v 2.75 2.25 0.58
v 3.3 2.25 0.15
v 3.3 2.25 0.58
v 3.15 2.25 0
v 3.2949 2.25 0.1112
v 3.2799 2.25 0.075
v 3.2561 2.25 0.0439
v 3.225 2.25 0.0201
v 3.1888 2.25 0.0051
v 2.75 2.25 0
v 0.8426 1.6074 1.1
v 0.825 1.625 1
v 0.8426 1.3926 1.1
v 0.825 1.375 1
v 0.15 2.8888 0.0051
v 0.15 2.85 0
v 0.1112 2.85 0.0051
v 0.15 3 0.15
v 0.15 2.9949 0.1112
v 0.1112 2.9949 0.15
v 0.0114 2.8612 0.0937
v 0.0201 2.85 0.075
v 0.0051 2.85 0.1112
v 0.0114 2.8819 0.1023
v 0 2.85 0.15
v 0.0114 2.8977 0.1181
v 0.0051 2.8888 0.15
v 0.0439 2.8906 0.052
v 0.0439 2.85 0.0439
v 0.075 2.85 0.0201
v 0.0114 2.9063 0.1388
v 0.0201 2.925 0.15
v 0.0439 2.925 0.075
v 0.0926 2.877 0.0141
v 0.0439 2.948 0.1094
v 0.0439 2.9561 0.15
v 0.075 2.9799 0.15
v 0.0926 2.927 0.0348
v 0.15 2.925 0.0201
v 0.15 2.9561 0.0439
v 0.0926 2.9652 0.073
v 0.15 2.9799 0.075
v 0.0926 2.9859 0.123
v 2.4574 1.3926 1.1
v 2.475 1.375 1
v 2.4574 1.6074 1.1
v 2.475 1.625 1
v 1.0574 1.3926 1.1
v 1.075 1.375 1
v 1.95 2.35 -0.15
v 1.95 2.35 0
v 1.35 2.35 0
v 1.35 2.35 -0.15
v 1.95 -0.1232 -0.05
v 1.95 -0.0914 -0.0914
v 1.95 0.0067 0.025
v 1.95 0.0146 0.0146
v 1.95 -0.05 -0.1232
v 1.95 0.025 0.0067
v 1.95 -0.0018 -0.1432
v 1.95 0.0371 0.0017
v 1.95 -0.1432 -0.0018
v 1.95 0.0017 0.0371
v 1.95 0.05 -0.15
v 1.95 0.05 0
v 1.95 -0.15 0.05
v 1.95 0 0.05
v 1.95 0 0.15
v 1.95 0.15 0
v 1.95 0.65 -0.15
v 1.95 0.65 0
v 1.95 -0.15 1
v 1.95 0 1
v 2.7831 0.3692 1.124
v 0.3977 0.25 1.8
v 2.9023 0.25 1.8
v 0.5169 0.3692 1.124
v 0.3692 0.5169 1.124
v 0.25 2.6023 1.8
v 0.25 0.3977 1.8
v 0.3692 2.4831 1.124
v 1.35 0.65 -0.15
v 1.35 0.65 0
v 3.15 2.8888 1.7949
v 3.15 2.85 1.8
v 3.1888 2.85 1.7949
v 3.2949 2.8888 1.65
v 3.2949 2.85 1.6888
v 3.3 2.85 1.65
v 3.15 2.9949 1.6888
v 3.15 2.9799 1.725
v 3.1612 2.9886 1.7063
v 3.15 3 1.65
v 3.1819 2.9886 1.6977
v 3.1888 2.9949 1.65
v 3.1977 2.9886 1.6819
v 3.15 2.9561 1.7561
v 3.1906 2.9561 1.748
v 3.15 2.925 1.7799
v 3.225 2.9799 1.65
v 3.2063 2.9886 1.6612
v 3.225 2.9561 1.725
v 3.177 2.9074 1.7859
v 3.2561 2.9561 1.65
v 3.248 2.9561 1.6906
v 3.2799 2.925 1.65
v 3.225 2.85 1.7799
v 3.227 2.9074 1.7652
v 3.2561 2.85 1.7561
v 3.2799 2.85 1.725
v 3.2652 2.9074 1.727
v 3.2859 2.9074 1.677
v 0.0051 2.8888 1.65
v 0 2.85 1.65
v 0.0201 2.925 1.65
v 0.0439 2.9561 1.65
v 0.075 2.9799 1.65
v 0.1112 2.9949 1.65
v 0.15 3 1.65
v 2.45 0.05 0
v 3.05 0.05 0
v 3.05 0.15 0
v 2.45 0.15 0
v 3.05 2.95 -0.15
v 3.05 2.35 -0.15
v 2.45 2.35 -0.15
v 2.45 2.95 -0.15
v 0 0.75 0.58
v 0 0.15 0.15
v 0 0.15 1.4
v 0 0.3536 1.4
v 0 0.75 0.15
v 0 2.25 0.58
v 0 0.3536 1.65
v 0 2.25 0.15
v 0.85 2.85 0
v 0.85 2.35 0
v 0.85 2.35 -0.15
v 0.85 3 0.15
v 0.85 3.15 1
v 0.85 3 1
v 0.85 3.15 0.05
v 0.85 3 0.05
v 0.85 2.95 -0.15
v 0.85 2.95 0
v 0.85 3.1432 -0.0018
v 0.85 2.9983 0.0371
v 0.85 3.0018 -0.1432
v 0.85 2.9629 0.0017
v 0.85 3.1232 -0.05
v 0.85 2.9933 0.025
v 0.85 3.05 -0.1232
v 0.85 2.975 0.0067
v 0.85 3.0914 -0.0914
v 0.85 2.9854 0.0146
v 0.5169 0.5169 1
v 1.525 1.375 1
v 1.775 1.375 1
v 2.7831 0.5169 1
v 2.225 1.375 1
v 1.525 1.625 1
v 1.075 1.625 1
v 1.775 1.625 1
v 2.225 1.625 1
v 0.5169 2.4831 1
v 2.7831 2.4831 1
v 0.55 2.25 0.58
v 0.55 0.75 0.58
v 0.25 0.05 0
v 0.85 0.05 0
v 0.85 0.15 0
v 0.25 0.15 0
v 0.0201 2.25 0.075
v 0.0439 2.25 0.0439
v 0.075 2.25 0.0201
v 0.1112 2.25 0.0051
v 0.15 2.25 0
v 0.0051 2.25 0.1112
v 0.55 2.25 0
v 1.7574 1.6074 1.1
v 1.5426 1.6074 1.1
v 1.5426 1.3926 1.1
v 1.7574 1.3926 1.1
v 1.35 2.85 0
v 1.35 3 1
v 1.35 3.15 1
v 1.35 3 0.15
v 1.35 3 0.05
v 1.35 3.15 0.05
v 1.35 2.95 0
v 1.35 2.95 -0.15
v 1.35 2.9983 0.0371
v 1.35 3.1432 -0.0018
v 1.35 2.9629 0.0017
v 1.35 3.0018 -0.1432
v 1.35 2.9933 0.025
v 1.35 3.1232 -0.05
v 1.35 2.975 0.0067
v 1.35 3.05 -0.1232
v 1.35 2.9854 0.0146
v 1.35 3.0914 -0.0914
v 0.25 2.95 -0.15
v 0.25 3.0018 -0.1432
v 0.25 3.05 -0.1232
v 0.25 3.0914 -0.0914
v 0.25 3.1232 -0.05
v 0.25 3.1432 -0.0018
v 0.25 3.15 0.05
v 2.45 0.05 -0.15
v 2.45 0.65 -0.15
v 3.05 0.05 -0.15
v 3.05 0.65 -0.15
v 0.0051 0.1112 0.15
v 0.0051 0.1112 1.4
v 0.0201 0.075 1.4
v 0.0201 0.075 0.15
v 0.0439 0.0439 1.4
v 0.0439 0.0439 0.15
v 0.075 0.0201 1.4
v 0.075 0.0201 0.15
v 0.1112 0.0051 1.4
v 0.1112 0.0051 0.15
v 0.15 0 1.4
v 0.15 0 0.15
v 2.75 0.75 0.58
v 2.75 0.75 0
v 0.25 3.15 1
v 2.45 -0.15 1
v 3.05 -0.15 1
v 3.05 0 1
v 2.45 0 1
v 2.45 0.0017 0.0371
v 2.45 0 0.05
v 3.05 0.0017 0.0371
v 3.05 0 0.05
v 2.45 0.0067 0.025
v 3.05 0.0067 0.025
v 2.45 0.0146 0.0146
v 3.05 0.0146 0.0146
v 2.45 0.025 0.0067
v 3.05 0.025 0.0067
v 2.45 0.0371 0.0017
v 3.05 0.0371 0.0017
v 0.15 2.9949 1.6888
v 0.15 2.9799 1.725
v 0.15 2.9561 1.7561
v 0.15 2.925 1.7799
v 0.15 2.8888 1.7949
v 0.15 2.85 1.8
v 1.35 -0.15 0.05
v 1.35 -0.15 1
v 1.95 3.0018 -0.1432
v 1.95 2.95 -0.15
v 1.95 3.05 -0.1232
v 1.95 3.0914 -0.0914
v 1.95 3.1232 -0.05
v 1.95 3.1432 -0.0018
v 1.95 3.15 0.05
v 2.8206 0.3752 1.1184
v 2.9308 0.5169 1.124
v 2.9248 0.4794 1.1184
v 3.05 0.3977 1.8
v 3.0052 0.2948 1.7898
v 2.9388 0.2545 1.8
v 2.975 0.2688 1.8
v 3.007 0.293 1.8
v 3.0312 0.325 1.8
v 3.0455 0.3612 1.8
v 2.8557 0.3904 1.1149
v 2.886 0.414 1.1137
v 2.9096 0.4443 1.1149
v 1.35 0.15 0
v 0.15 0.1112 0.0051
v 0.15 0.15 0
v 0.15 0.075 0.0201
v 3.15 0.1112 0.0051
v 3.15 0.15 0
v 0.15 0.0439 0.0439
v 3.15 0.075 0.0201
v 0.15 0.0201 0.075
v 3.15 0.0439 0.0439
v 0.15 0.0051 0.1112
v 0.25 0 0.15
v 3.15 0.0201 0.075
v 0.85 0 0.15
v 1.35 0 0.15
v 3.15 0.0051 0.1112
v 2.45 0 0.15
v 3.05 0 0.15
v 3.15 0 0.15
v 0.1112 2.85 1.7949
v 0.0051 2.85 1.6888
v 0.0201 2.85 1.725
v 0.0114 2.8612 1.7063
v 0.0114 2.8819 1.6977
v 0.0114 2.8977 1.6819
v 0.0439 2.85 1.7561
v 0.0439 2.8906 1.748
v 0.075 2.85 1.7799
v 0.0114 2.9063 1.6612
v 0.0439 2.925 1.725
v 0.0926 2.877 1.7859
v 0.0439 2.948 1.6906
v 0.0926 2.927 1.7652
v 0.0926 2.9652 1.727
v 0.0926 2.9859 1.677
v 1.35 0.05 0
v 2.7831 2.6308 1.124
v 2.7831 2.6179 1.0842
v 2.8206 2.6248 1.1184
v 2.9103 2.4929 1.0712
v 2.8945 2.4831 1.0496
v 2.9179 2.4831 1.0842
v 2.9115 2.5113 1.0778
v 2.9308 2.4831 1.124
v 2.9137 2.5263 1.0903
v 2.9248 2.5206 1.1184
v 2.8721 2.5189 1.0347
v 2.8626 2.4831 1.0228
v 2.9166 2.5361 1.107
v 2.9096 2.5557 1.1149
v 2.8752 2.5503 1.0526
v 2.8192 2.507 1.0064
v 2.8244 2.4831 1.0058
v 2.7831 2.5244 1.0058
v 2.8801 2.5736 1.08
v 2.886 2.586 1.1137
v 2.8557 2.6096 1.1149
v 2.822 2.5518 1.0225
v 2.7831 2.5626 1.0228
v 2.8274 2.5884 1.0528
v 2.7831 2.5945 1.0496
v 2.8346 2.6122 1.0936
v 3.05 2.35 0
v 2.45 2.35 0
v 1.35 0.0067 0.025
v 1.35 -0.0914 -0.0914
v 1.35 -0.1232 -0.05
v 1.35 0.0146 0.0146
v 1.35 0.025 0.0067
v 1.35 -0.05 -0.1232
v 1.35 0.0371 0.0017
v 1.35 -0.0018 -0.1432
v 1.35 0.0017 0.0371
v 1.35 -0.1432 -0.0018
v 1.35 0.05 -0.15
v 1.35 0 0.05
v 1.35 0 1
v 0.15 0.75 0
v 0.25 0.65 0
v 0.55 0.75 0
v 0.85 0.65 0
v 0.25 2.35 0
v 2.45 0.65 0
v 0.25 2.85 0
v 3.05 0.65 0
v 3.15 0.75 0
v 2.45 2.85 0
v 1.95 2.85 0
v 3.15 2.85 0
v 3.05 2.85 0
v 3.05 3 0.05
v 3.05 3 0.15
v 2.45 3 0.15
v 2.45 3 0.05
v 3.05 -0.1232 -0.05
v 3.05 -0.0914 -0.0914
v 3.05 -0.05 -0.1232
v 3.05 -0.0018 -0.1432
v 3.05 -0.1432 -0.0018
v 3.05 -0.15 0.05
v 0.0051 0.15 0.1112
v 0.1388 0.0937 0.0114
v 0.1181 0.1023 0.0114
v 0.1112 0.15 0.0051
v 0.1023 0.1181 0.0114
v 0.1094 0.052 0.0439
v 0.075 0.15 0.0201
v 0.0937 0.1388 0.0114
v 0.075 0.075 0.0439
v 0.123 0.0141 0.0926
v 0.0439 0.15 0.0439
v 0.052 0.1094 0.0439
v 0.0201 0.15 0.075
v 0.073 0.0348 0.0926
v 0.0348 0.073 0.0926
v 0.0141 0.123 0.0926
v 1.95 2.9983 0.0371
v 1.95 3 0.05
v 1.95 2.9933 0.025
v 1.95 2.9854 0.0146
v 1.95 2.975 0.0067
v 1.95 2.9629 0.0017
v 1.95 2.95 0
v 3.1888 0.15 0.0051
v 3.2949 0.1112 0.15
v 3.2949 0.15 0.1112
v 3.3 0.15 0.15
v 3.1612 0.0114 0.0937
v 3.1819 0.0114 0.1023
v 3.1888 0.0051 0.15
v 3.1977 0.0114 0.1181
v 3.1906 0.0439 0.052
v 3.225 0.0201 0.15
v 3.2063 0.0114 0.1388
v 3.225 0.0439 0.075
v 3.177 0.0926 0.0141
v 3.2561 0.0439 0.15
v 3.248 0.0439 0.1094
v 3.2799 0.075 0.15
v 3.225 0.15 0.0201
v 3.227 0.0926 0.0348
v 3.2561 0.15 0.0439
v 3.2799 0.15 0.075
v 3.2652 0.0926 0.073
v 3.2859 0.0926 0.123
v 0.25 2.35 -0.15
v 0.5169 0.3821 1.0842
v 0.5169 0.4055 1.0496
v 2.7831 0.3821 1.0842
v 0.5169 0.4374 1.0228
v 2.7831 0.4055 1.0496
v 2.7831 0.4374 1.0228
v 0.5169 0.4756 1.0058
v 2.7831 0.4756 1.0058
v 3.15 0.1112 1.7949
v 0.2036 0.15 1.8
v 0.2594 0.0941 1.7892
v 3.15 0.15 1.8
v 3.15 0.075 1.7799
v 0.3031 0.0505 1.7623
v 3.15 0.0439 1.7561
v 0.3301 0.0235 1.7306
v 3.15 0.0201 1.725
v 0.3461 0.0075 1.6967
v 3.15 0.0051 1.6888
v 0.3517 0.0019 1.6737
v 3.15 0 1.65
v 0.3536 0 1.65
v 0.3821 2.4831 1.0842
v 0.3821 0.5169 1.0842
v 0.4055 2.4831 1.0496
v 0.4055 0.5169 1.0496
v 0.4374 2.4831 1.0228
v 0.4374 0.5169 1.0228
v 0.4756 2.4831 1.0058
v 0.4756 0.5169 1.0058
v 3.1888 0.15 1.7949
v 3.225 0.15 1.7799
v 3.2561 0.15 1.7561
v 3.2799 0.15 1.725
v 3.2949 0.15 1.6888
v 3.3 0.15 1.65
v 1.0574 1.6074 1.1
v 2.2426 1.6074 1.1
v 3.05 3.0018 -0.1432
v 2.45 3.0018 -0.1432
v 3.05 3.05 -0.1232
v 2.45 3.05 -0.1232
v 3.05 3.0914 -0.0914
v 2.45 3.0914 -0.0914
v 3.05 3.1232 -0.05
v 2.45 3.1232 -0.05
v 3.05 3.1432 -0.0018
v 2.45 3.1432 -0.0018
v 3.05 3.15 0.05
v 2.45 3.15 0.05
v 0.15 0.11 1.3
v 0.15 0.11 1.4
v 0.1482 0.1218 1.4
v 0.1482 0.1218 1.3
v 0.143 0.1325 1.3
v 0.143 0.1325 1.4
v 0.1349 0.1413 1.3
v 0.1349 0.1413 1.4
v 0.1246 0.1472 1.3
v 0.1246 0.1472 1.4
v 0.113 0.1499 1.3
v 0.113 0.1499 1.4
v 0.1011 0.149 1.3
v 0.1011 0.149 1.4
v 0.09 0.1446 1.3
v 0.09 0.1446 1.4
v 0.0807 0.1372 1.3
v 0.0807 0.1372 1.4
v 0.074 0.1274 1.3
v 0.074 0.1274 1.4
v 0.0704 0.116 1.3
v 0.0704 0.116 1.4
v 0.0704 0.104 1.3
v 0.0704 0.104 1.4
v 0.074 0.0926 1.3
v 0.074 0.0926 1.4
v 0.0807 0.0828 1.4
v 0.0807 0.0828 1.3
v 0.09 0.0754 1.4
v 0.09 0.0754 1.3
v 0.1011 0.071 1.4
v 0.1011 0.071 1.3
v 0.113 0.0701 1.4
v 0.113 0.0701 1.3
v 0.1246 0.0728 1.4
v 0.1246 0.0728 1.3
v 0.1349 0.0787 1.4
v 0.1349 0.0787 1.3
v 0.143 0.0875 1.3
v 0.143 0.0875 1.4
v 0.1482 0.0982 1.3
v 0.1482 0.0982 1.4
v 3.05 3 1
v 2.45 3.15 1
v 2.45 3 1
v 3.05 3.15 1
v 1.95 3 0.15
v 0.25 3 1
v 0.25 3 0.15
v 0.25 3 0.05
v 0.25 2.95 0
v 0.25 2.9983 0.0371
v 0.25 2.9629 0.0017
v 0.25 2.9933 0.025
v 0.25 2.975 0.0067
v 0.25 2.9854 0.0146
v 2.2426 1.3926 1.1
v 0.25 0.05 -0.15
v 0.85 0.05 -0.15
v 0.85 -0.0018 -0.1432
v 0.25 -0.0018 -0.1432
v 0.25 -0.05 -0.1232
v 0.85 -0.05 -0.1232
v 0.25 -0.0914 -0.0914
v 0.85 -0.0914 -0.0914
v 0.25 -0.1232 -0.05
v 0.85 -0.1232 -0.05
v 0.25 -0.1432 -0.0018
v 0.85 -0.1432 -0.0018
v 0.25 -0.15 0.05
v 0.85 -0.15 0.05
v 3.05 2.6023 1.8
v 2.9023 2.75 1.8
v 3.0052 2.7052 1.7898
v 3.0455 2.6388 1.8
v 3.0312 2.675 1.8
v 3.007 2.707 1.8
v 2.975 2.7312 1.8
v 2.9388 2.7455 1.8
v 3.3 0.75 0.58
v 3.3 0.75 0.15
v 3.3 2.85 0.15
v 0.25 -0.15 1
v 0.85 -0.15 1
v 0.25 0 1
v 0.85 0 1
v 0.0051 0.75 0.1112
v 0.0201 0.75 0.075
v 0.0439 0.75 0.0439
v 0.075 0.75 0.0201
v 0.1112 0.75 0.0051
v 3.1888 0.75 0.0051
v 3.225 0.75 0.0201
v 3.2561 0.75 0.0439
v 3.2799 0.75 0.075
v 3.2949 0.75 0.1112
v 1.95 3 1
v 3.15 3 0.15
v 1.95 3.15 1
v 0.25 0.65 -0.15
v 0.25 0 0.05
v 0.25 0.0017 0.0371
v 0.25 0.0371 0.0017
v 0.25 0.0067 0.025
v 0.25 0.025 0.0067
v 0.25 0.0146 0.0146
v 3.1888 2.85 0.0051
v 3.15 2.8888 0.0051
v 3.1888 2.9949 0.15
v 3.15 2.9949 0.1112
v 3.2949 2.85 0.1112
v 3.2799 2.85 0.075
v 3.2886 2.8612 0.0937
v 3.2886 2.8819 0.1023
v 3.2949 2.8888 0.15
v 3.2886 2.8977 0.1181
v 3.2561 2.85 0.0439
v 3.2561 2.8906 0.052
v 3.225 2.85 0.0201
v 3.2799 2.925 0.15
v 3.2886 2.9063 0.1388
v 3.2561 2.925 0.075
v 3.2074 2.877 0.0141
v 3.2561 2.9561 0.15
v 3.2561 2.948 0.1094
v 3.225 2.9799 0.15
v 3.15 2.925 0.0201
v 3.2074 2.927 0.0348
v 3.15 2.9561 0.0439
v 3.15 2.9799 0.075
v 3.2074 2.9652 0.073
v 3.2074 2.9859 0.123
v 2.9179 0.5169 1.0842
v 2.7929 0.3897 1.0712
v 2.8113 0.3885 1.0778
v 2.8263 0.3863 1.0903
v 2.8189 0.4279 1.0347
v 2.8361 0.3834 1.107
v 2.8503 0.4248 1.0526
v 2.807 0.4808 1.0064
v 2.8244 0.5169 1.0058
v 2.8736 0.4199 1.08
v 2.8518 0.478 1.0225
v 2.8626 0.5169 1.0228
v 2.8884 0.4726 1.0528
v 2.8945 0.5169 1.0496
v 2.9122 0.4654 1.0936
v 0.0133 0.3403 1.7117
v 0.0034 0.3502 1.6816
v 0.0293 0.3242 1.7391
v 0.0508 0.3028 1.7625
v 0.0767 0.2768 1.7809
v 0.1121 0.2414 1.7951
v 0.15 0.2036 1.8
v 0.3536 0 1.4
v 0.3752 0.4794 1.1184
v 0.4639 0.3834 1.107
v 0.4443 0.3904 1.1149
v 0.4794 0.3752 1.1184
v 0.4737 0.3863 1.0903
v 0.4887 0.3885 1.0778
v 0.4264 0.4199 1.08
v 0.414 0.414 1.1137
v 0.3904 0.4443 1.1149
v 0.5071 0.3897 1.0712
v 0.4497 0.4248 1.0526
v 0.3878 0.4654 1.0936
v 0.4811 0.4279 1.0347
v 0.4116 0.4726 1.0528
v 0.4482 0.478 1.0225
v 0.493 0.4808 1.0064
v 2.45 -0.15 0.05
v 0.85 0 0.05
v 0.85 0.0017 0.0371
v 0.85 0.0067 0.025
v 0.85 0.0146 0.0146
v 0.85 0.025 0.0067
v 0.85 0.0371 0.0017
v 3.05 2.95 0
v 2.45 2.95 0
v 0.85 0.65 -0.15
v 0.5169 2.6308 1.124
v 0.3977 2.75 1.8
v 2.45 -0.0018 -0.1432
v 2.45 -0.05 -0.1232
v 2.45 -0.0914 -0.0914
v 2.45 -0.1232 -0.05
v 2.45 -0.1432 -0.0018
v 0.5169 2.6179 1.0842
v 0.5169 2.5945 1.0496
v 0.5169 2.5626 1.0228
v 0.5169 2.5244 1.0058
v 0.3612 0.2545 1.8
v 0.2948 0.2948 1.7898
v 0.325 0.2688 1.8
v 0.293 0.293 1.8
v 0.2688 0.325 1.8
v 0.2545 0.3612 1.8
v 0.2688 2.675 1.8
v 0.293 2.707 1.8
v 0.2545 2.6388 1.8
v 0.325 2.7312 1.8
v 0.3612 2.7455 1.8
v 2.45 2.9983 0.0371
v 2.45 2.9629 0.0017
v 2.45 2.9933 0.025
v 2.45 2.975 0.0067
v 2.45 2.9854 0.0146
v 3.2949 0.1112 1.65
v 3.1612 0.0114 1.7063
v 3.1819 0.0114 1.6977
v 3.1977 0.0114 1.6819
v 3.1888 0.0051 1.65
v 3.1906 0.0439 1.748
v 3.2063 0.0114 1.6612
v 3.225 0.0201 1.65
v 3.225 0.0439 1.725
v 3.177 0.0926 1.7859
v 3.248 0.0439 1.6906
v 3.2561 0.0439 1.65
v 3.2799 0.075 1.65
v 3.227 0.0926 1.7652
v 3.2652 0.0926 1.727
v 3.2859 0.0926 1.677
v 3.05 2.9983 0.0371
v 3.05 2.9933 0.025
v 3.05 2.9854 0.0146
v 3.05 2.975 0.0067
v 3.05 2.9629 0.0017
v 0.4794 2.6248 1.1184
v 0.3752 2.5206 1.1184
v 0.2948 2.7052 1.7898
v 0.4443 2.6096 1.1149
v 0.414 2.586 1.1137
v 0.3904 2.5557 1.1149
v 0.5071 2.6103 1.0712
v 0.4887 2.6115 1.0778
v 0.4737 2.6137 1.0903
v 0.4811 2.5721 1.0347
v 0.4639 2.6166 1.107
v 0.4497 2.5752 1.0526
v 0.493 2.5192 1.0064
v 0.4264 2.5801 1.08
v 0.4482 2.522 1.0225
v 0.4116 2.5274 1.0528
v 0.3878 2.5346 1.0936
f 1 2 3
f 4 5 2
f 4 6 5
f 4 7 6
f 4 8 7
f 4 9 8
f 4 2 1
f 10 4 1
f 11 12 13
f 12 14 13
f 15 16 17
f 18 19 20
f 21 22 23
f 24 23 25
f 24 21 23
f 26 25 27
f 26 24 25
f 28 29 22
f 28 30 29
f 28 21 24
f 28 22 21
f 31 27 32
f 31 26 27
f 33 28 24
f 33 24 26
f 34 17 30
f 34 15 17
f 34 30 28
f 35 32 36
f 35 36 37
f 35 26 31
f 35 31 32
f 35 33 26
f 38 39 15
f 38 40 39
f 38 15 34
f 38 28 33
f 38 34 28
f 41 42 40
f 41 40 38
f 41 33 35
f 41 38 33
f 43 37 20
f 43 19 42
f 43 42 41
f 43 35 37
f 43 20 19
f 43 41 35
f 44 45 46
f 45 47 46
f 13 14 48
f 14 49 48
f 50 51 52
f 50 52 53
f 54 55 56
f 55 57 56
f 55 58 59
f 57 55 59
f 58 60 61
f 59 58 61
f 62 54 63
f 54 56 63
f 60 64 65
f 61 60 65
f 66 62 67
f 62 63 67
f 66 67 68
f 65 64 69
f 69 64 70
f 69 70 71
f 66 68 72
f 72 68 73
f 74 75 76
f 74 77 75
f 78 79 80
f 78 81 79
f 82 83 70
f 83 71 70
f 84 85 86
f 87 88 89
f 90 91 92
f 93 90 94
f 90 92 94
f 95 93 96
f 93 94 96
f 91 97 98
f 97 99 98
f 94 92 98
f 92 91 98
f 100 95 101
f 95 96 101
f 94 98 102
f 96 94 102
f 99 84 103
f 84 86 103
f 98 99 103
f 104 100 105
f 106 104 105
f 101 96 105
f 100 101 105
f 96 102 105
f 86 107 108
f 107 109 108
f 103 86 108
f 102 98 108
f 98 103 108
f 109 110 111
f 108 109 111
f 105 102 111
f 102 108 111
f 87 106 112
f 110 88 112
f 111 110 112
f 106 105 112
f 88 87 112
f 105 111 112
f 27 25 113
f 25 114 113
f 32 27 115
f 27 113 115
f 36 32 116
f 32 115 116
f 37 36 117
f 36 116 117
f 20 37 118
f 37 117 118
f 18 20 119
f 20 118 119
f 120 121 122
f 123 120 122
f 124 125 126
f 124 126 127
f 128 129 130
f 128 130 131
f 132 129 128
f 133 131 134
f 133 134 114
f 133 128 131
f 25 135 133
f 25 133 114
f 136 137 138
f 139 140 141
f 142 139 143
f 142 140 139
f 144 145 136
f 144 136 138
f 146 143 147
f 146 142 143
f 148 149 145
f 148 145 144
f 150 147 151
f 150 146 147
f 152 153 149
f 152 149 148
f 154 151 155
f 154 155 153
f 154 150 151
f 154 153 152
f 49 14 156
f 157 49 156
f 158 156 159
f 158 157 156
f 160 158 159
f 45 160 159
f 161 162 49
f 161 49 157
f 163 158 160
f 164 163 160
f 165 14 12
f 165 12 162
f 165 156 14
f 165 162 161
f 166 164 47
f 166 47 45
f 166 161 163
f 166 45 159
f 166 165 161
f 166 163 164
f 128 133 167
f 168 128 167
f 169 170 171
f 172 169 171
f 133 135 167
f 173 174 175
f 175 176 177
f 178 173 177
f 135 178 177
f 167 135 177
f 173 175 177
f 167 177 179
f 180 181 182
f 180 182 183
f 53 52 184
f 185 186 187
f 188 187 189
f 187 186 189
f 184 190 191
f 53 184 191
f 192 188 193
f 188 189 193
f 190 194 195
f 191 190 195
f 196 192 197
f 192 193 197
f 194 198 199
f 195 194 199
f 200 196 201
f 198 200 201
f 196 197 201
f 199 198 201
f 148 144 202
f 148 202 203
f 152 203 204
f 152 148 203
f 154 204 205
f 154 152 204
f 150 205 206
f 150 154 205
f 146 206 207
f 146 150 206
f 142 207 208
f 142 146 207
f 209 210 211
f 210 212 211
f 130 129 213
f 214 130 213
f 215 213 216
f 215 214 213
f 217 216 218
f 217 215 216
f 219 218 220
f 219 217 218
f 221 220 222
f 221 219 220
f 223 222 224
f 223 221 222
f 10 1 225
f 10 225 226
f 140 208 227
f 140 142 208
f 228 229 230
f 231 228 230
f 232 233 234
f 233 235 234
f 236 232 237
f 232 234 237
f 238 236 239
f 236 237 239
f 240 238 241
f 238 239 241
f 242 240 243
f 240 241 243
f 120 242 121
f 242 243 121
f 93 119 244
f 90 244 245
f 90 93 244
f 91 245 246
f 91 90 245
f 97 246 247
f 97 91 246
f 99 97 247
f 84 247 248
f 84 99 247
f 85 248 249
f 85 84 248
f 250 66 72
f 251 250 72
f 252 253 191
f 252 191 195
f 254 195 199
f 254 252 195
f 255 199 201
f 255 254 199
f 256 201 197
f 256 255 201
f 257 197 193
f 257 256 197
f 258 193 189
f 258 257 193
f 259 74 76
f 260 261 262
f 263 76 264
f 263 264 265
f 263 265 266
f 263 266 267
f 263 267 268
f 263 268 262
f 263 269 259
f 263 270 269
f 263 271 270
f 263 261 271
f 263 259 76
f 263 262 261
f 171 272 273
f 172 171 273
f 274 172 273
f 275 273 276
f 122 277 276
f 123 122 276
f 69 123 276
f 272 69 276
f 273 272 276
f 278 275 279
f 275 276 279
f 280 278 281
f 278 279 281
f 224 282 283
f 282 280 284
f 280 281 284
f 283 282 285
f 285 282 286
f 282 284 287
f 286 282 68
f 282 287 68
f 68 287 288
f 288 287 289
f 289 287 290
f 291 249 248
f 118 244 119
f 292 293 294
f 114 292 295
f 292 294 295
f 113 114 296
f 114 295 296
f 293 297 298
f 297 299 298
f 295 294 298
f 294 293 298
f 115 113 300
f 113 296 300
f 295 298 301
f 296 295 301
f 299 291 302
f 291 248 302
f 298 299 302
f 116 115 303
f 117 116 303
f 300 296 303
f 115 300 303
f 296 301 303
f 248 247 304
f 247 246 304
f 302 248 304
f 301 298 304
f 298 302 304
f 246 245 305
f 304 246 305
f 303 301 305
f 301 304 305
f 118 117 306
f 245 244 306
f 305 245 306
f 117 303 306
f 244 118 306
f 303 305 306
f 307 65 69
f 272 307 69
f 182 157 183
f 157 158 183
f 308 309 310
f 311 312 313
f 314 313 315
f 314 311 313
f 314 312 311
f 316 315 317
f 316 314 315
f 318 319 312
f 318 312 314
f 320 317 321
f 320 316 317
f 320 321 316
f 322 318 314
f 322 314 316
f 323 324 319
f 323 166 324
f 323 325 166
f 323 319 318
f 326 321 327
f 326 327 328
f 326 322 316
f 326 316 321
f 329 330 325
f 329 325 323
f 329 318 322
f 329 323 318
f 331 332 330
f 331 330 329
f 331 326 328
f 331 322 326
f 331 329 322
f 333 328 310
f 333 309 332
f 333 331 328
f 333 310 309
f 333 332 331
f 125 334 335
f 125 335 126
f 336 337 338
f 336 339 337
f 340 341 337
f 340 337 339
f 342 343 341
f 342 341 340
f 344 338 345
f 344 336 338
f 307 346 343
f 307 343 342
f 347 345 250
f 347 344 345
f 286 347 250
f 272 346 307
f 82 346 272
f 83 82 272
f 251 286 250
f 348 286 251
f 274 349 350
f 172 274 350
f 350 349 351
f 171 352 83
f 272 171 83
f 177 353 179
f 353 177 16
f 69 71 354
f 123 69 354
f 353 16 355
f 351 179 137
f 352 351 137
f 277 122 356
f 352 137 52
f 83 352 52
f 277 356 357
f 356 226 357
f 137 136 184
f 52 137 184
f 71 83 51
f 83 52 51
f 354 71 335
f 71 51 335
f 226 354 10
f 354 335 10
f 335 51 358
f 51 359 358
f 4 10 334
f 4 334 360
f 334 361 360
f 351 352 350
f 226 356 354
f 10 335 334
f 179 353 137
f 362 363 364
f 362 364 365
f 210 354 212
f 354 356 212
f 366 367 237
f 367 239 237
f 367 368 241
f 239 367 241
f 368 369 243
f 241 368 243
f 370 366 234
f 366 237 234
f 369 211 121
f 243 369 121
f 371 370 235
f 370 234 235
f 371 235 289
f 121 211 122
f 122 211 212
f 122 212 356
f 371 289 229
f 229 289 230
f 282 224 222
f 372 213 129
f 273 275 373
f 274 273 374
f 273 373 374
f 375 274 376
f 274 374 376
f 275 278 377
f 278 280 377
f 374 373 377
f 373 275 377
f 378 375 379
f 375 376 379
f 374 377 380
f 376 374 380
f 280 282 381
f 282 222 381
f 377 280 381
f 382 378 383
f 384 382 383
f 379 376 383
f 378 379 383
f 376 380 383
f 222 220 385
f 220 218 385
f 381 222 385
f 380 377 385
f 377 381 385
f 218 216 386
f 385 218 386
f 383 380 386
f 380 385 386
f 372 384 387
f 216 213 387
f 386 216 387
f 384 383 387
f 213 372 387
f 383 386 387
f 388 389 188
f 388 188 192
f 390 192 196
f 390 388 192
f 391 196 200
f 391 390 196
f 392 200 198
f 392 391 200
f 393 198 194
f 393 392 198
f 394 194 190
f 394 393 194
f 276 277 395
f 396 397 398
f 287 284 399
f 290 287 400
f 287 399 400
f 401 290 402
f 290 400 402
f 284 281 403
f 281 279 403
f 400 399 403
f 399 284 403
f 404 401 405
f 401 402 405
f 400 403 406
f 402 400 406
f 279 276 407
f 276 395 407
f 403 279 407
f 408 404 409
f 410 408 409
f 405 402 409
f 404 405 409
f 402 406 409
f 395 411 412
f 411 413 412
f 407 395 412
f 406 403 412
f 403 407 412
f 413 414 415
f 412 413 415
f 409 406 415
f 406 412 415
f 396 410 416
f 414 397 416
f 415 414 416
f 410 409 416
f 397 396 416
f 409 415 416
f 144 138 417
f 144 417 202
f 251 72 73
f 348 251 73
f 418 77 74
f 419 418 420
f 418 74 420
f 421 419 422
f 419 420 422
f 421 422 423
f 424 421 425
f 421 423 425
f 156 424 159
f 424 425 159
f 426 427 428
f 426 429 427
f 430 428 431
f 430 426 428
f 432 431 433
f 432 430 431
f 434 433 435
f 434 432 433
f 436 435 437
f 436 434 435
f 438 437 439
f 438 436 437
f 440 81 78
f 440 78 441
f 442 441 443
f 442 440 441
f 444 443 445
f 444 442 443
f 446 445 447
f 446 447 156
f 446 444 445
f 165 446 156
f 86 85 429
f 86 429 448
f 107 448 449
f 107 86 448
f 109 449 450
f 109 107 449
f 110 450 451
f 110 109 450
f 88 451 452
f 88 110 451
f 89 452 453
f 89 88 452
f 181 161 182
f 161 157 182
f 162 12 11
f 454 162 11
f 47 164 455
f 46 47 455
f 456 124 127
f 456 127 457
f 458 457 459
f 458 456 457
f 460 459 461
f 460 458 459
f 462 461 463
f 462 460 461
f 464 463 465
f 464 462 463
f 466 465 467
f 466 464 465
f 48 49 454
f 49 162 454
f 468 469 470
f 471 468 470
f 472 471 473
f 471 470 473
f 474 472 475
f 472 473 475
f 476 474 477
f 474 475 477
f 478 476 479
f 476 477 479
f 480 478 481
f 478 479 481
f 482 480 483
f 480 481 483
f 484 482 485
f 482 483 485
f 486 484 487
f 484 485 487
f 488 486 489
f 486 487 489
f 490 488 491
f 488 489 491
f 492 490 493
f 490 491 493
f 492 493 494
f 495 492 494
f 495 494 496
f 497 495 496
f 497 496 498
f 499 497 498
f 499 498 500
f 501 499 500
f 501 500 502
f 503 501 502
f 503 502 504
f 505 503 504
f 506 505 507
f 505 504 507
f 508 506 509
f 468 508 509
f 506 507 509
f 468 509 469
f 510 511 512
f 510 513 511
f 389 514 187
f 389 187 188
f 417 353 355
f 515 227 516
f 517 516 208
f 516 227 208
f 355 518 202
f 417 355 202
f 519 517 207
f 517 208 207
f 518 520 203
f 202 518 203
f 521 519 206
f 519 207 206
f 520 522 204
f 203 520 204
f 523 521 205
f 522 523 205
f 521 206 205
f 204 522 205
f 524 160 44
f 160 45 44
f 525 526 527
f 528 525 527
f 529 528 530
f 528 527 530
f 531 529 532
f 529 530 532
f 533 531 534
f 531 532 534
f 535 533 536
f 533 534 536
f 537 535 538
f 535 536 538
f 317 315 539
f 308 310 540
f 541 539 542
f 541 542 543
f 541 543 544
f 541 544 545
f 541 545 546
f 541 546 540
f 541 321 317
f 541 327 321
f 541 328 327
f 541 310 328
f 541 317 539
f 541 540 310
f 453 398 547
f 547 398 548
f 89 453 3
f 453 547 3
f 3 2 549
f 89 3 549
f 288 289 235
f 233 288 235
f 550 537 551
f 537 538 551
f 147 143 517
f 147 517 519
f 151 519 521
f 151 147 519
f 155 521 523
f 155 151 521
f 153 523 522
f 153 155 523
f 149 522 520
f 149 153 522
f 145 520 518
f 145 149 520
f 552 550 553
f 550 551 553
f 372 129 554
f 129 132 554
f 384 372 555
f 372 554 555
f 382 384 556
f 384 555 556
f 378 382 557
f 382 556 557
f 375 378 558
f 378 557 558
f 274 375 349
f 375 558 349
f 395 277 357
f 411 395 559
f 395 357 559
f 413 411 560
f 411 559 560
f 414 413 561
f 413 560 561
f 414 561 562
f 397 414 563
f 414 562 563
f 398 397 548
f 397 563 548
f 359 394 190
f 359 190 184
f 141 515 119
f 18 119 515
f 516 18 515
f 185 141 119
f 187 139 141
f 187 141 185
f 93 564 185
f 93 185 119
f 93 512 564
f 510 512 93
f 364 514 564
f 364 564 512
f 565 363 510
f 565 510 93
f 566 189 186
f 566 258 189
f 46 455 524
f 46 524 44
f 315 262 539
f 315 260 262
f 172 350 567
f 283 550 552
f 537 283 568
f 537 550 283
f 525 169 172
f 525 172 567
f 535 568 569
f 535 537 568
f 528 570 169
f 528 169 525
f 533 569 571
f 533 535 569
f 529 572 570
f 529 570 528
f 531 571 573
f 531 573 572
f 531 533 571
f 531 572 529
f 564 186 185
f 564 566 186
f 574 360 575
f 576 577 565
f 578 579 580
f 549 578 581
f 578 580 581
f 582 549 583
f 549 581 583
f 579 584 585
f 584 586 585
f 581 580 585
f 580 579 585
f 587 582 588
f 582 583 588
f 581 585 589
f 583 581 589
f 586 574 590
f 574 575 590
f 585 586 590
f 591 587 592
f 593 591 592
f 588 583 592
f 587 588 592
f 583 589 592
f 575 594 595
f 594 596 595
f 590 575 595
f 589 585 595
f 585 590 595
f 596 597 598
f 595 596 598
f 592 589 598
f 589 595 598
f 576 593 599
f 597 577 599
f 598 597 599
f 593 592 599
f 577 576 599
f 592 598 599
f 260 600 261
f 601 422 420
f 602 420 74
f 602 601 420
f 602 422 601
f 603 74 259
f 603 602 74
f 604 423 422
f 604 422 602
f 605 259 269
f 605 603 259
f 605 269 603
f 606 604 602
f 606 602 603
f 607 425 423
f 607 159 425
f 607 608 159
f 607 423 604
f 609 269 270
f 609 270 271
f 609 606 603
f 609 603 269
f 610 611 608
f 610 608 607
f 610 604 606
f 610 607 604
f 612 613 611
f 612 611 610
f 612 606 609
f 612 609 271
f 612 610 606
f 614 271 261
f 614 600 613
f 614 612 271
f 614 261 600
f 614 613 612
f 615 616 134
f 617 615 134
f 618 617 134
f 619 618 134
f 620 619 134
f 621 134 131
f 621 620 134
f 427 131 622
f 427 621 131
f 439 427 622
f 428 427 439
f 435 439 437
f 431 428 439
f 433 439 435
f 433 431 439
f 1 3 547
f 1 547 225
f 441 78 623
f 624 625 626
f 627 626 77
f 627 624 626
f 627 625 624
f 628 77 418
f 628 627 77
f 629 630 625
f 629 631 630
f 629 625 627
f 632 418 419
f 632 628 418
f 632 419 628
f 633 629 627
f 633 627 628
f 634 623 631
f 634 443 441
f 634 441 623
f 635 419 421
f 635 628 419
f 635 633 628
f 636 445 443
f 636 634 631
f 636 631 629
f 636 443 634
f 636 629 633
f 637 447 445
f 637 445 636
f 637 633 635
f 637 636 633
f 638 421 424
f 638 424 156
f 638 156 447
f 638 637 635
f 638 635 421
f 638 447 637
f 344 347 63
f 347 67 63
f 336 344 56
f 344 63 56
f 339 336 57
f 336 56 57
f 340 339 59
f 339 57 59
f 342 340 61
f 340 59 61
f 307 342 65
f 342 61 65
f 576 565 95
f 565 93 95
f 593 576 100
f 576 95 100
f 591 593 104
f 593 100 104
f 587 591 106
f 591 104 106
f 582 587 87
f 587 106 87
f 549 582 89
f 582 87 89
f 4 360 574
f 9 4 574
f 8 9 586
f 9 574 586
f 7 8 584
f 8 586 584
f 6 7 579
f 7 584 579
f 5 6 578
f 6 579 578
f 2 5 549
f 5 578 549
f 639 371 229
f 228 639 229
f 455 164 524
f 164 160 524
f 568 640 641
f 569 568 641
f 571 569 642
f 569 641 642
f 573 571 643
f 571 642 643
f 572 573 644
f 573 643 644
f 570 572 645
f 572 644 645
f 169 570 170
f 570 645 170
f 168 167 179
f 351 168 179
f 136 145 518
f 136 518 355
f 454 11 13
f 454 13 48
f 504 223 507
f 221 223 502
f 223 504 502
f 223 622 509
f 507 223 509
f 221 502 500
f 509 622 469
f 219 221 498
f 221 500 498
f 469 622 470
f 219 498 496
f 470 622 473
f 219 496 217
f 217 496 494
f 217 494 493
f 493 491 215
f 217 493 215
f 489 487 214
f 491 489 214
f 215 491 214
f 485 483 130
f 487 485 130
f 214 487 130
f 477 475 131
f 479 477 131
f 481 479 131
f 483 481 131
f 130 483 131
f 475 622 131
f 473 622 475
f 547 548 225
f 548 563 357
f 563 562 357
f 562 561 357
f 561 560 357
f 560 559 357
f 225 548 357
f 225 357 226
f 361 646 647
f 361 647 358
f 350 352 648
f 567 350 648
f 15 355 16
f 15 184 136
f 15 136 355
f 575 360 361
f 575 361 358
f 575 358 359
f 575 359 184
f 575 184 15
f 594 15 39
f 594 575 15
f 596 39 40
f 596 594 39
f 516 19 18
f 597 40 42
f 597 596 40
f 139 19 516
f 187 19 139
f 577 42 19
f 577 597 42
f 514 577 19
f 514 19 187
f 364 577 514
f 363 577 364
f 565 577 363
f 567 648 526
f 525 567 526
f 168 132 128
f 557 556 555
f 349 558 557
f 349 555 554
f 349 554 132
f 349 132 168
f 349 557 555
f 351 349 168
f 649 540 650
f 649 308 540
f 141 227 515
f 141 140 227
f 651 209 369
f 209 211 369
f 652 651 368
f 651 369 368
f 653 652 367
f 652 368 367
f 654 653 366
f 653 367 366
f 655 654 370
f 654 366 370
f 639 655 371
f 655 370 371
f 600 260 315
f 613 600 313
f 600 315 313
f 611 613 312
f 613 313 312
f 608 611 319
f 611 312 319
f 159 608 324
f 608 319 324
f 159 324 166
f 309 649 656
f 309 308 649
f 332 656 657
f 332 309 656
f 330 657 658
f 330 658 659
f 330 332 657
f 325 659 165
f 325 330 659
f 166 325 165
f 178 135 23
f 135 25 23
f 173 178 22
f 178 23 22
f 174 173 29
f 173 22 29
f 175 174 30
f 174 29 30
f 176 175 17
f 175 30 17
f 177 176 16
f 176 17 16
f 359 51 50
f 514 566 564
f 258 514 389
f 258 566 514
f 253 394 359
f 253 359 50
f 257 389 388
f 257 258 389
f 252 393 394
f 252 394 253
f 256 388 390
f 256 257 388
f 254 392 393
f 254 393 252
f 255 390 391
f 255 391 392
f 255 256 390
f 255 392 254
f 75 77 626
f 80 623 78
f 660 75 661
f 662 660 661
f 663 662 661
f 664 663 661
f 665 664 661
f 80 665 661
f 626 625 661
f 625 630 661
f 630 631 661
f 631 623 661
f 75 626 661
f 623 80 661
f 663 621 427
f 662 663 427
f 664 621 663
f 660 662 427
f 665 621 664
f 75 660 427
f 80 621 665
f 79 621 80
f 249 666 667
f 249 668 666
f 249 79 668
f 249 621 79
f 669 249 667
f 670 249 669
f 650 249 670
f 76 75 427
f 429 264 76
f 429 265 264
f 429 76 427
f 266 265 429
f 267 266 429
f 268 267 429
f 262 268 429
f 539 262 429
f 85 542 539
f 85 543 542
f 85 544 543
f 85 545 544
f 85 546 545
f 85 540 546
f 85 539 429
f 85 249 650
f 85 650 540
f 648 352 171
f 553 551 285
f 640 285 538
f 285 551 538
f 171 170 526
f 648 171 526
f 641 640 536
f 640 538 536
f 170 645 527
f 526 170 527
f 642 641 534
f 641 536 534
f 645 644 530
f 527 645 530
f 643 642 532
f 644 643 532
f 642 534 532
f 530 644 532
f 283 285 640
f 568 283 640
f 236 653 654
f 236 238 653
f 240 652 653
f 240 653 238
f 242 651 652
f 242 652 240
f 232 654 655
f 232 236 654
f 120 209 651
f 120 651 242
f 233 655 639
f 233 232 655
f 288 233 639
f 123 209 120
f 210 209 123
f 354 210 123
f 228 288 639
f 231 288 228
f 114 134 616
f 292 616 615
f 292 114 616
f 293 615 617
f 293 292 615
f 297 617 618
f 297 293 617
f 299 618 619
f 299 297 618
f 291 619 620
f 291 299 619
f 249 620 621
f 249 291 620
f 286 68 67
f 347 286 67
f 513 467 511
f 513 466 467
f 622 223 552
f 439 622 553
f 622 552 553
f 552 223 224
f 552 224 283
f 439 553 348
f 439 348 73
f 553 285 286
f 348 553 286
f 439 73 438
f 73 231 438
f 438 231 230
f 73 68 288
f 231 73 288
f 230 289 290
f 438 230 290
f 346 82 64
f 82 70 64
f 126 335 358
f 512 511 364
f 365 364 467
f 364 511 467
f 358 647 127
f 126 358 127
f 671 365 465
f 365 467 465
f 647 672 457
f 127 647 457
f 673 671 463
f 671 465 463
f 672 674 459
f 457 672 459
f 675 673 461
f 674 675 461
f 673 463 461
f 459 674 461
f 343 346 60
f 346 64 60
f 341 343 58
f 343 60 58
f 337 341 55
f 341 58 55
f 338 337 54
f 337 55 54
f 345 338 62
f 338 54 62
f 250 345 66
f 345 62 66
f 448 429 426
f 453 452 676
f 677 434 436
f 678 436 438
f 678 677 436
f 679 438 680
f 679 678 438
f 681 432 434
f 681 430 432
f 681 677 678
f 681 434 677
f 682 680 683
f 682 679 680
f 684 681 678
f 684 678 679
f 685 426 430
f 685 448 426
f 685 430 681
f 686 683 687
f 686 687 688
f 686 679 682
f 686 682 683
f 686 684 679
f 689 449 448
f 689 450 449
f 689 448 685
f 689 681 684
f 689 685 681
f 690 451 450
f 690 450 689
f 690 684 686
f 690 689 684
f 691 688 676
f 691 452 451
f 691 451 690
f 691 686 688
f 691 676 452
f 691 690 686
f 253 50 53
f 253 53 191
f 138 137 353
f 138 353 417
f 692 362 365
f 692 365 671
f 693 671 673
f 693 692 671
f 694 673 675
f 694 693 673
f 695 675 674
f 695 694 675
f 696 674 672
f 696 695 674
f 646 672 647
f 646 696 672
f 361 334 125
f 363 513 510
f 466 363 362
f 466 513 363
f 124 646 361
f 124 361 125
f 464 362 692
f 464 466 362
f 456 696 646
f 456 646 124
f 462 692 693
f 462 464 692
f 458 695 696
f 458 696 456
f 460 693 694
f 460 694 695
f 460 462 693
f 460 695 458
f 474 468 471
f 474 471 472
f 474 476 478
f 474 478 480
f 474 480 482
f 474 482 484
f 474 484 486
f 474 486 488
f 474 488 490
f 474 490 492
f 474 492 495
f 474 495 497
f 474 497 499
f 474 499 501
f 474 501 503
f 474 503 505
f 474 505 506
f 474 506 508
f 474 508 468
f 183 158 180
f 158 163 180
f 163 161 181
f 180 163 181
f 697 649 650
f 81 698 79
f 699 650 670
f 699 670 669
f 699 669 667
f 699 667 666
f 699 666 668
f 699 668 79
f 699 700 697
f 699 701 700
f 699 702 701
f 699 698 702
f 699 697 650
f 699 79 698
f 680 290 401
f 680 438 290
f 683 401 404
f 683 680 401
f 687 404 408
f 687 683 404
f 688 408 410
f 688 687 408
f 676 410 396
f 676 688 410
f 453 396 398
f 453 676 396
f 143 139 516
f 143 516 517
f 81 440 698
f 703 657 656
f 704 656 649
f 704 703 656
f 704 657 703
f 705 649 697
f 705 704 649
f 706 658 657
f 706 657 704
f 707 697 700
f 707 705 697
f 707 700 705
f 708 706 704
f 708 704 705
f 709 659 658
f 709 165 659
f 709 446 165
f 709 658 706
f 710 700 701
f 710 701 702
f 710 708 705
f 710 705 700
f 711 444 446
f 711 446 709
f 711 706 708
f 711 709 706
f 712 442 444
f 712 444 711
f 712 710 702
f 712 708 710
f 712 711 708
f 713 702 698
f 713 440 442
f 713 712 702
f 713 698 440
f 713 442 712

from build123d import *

# Parameters (mm, degrees)
SKETCH1_W            = 3.3
SKETCH1_H            = 3
BOSS_EXTRUDE1_DEPTH  = 1.8
CUT_EXTRUDE2_DEPTH   = 0.4
SKETCH2_W            = 2.8
SKETCH2_H            = 2.5
CUT_EXTRUDE1_DEPTH   = 0.8
CUT_EXTRUDE1_TAPER   = 10
FILLET1_R            = 0.15
EXTRUDE_THIN1_DEPTH  = 0.3
LPATTERN1_COUNT      = 3
LPATTERN1_PITCH      = 1.1
MIRROR1_COPY_1_DEPTH = 0.3
MIRROR1_COPY_2_DEPTH = 0.3
SKETCH5_R            = 0.04
CUT_EXTRUDE3_DEPTH   = 0.1
SKETCH6_W            = 0.25
SKETCH6_H            = 0.25
BOSS_EXTRUDE2_DEPTH  = 0.1
BOSS_EXTRUDE2_TAPER  = 10
LPATTERN2_COUNT      = 3
LPATTERN2_PITCH      = 0.7
SKETCH7_W            = 0.55
SKETCH7_H            = 0.58
CUT_EXTRUDE4_DEPTH   = 0.75


with BuildPart() as part:
    # Sketch1 → Boss-Extrude1 (new body)
    with BuildSketch(Plane.XY):
        with Locations((1.65, 1.5)):
            Rectangle(SKETCH1_W, SKETCH1_H)
    extrude(amount=BOSS_EXTRUDE1_DEPTH)

    # Sketch4 → Cut-Extrude2 (cut)
    with BuildSketch(Plane.XY.offset(1.8)):
        Polygon((0, 0.353553391), (0.353553391, 0), (0, 0), align=None)
    extrude(amount=-CUT_EXTRUDE2_DEPTH, mode=Mode.SUBTRACT)

    # Sketch2 → Cut-Extrude1 (cut)
    with BuildSketch(Plane.XY.offset(1.8)):
        with Locations((1.65, 1.5)):
            Rectangle(SKETCH2_W, SKETCH2_H)
    extrude(amount=-CUT_EXTRUDE1_DEPTH, taper=CUT_EXTRUDE1_TAPER, mode=Mode.SUBTRACT)

    # Fillet1
    fillet1_edges = [part.edges().sort_by_distance(p)[0] for p in [
        (3.3, 1.5, 1.8),
        (1.65, 3, 1.8),
        (1.826776695, 0, 1.8),
        (0, 0, 0.7),
        (0.391061585, 1.5, 1),
        (0.320530792, 0.320530792, 1.4),
        (1.65, 2.608938415, 1),
        (0.320530792, 2.679469208, 1.4),
        (2.908938415, 1.5, 1),
        (2.979469208, 2.679469208, 1.4),
        (1.65, 0.391061585, 1),
        (2.979469208, 0.320530792, 1.4),
        (0, 1.676776695, 1.8),
        (1.65, 3, 0),
        (3.3, 1.5, 0),
        (1.65, 0, 0),
        (0, 1.5, 0),
        (0, 3, 0.9),
        (3.3, 3, 0.9),
        (3.3, 0, 0.9),
    ]]
    fillet(fillet1_edges, radius=FILLET1_R)

    # Sketch3 → Extrude-Thin1 (add, symmetric)
    with BuildSketch(Plane(origin=(0.55, 0, 0), x_dir=(0, 0, -1), z_dir=(1, 0, 0))):
        with BuildLine():
            Line((-1, 3), (-0.05, 3))
            ThreePointArc((-0.05, 3), (-0.014644661, 2.985355339), (0, 2.95))
            Line((0, 2.95), (0, 2.35))
            Line((0, 2.35), (0.15, 2.35))
            Line((0.15, 2.35), (0.15, 2.95))
            ThreePointArc((0.15, 2.95), (0.091421356, 3.091421356), (-0.05, 3.15))
            Line((-0.05, 3.15), (-1, 3.15))
            Line((-1, 3.15), (-1, 3))
        make_face()
    extrude_thin1 = extrude(amount=EXTRUDE_THIN1_DEPTH, both=True)

    # LPattern1: Extrude-Thin1 ×3
    with Locations(*[(i * LPATTERN1_PITCH, 0, 0) for i in range(1, LPATTERN1_COUNT)]):
        add(extrude_thin1)

    # Mirror1: Extrude-Thin1 across plane
    add(extrude_thin1.mirror(Plane.ZX.offset(1.5)))

    # Mirror1 copy 1 sketch → Mirror1 copy 1 (add, symmetric)
    with BuildSketch(Plane(origin=(1.65, 3, 0), x_dir=(0, 0, -1), z_dir=(1, 0, 0))):
        with BuildLine():
            Line((-1, -3), (-0.05, -3))
            ThreePointArc((-0.05, -3), (-0.014644661, -2.985355339), (0, -2.95))
            Line((0, -2.95), (0, -2.35))
            Line((0, -2.35), (0.15, -2.35))
            Line((0.15, -2.35), (0.15, -2.95))
            ThreePointArc((0.15, -2.95), (0.091421356, -3.091421356), (-0.05, -3.15))
            Line((-0.05, -3.15), (-1, -3.15))
            Line((-1, -3.15), (-1, -3))
        make_face()
    extrude(amount=MIRROR1_COPY_1_DEPTH, both=True)

    # Mirror1 copy 2 sketch → Mirror1 copy 2 (add, symmetric)
    with BuildSketch(Plane(origin=(2.75, 3, 0), x_dir=(0, 0, -1), z_dir=(1, 0, 0))):
        with BuildLine():
            Line((-1, -3), (-0.05, -3))
            ThreePointArc((-0.05, -3), (-0.014644661, -2.985355339), (0, -2.95))
            Line((0, -2.95), (0, -2.35))
            Line((0, -2.35), (0.15, -2.35))
            Line((0.15, -2.35), (0.15, -2.95))
            ThreePointArc((0.15, -2.95), (0.091421356, -3.091421356), (-0.05, -3.15))
            Line((-0.05, -3.15), (-1, -3.15))
            Line((-1, -3.15), (-1, -3))
        make_face()
    extrude(amount=MIRROR1_COPY_2_DEPTH, both=True)

    # Sketch5 → Cut-Extrude3 (cut)
    with BuildSketch(Plane.XY.offset(1.4)):
        with Locations((0.11, 0.11)):
            Circle(SKETCH5_R)
    extrude(amount=-CUT_EXTRUDE3_DEPTH, mode=Mode.SUBTRACT)

    # Sketch6 → Boss-Extrude2 (add)
    with BuildSketch(Plane.XY.offset(1)):
        with Locations((0.95, 1.5)):
            Rectangle(SKETCH6_W, SKETCH6_H)
    boss_extrude2 = extrude(amount=BOSS_EXTRUDE2_DEPTH, taper=BOSS_EXTRUDE2_TAPER)

    # LPattern2: Boss-Extrude2 ×3
    with Locations(*[(i * LPATTERN2_PITCH, 0, 0) for i in range(1, LPATTERN2_COUNT)]):
        add(boss_extrude2)

    # Sketch7 → Cut-Extrude4 (cut, symmetric)
    with BuildSketch(Plane(origin=(0, 1.5, 0), x_dir=(1, 0, 0), z_dir=(0, 1, 0))):
        with Locations((0.275, -0.29)):
            Rectangle(SKETCH7_W, SKETCH7_H)
    cut_extrude4 = extrude(amount=CUT_EXTRUDE4_DEPTH, both=True, mode=Mode.SUBTRACT)

    # Mirror2: Cut-Extrude4 across plane
    add(cut_extrude4.mirror(Plane(origin=(1.65, 0, 0), x_dir=(0, 0, 1), z_dir=(1, 0, 0))), mode=Mode.SUBTRACT)


solid = part.part
